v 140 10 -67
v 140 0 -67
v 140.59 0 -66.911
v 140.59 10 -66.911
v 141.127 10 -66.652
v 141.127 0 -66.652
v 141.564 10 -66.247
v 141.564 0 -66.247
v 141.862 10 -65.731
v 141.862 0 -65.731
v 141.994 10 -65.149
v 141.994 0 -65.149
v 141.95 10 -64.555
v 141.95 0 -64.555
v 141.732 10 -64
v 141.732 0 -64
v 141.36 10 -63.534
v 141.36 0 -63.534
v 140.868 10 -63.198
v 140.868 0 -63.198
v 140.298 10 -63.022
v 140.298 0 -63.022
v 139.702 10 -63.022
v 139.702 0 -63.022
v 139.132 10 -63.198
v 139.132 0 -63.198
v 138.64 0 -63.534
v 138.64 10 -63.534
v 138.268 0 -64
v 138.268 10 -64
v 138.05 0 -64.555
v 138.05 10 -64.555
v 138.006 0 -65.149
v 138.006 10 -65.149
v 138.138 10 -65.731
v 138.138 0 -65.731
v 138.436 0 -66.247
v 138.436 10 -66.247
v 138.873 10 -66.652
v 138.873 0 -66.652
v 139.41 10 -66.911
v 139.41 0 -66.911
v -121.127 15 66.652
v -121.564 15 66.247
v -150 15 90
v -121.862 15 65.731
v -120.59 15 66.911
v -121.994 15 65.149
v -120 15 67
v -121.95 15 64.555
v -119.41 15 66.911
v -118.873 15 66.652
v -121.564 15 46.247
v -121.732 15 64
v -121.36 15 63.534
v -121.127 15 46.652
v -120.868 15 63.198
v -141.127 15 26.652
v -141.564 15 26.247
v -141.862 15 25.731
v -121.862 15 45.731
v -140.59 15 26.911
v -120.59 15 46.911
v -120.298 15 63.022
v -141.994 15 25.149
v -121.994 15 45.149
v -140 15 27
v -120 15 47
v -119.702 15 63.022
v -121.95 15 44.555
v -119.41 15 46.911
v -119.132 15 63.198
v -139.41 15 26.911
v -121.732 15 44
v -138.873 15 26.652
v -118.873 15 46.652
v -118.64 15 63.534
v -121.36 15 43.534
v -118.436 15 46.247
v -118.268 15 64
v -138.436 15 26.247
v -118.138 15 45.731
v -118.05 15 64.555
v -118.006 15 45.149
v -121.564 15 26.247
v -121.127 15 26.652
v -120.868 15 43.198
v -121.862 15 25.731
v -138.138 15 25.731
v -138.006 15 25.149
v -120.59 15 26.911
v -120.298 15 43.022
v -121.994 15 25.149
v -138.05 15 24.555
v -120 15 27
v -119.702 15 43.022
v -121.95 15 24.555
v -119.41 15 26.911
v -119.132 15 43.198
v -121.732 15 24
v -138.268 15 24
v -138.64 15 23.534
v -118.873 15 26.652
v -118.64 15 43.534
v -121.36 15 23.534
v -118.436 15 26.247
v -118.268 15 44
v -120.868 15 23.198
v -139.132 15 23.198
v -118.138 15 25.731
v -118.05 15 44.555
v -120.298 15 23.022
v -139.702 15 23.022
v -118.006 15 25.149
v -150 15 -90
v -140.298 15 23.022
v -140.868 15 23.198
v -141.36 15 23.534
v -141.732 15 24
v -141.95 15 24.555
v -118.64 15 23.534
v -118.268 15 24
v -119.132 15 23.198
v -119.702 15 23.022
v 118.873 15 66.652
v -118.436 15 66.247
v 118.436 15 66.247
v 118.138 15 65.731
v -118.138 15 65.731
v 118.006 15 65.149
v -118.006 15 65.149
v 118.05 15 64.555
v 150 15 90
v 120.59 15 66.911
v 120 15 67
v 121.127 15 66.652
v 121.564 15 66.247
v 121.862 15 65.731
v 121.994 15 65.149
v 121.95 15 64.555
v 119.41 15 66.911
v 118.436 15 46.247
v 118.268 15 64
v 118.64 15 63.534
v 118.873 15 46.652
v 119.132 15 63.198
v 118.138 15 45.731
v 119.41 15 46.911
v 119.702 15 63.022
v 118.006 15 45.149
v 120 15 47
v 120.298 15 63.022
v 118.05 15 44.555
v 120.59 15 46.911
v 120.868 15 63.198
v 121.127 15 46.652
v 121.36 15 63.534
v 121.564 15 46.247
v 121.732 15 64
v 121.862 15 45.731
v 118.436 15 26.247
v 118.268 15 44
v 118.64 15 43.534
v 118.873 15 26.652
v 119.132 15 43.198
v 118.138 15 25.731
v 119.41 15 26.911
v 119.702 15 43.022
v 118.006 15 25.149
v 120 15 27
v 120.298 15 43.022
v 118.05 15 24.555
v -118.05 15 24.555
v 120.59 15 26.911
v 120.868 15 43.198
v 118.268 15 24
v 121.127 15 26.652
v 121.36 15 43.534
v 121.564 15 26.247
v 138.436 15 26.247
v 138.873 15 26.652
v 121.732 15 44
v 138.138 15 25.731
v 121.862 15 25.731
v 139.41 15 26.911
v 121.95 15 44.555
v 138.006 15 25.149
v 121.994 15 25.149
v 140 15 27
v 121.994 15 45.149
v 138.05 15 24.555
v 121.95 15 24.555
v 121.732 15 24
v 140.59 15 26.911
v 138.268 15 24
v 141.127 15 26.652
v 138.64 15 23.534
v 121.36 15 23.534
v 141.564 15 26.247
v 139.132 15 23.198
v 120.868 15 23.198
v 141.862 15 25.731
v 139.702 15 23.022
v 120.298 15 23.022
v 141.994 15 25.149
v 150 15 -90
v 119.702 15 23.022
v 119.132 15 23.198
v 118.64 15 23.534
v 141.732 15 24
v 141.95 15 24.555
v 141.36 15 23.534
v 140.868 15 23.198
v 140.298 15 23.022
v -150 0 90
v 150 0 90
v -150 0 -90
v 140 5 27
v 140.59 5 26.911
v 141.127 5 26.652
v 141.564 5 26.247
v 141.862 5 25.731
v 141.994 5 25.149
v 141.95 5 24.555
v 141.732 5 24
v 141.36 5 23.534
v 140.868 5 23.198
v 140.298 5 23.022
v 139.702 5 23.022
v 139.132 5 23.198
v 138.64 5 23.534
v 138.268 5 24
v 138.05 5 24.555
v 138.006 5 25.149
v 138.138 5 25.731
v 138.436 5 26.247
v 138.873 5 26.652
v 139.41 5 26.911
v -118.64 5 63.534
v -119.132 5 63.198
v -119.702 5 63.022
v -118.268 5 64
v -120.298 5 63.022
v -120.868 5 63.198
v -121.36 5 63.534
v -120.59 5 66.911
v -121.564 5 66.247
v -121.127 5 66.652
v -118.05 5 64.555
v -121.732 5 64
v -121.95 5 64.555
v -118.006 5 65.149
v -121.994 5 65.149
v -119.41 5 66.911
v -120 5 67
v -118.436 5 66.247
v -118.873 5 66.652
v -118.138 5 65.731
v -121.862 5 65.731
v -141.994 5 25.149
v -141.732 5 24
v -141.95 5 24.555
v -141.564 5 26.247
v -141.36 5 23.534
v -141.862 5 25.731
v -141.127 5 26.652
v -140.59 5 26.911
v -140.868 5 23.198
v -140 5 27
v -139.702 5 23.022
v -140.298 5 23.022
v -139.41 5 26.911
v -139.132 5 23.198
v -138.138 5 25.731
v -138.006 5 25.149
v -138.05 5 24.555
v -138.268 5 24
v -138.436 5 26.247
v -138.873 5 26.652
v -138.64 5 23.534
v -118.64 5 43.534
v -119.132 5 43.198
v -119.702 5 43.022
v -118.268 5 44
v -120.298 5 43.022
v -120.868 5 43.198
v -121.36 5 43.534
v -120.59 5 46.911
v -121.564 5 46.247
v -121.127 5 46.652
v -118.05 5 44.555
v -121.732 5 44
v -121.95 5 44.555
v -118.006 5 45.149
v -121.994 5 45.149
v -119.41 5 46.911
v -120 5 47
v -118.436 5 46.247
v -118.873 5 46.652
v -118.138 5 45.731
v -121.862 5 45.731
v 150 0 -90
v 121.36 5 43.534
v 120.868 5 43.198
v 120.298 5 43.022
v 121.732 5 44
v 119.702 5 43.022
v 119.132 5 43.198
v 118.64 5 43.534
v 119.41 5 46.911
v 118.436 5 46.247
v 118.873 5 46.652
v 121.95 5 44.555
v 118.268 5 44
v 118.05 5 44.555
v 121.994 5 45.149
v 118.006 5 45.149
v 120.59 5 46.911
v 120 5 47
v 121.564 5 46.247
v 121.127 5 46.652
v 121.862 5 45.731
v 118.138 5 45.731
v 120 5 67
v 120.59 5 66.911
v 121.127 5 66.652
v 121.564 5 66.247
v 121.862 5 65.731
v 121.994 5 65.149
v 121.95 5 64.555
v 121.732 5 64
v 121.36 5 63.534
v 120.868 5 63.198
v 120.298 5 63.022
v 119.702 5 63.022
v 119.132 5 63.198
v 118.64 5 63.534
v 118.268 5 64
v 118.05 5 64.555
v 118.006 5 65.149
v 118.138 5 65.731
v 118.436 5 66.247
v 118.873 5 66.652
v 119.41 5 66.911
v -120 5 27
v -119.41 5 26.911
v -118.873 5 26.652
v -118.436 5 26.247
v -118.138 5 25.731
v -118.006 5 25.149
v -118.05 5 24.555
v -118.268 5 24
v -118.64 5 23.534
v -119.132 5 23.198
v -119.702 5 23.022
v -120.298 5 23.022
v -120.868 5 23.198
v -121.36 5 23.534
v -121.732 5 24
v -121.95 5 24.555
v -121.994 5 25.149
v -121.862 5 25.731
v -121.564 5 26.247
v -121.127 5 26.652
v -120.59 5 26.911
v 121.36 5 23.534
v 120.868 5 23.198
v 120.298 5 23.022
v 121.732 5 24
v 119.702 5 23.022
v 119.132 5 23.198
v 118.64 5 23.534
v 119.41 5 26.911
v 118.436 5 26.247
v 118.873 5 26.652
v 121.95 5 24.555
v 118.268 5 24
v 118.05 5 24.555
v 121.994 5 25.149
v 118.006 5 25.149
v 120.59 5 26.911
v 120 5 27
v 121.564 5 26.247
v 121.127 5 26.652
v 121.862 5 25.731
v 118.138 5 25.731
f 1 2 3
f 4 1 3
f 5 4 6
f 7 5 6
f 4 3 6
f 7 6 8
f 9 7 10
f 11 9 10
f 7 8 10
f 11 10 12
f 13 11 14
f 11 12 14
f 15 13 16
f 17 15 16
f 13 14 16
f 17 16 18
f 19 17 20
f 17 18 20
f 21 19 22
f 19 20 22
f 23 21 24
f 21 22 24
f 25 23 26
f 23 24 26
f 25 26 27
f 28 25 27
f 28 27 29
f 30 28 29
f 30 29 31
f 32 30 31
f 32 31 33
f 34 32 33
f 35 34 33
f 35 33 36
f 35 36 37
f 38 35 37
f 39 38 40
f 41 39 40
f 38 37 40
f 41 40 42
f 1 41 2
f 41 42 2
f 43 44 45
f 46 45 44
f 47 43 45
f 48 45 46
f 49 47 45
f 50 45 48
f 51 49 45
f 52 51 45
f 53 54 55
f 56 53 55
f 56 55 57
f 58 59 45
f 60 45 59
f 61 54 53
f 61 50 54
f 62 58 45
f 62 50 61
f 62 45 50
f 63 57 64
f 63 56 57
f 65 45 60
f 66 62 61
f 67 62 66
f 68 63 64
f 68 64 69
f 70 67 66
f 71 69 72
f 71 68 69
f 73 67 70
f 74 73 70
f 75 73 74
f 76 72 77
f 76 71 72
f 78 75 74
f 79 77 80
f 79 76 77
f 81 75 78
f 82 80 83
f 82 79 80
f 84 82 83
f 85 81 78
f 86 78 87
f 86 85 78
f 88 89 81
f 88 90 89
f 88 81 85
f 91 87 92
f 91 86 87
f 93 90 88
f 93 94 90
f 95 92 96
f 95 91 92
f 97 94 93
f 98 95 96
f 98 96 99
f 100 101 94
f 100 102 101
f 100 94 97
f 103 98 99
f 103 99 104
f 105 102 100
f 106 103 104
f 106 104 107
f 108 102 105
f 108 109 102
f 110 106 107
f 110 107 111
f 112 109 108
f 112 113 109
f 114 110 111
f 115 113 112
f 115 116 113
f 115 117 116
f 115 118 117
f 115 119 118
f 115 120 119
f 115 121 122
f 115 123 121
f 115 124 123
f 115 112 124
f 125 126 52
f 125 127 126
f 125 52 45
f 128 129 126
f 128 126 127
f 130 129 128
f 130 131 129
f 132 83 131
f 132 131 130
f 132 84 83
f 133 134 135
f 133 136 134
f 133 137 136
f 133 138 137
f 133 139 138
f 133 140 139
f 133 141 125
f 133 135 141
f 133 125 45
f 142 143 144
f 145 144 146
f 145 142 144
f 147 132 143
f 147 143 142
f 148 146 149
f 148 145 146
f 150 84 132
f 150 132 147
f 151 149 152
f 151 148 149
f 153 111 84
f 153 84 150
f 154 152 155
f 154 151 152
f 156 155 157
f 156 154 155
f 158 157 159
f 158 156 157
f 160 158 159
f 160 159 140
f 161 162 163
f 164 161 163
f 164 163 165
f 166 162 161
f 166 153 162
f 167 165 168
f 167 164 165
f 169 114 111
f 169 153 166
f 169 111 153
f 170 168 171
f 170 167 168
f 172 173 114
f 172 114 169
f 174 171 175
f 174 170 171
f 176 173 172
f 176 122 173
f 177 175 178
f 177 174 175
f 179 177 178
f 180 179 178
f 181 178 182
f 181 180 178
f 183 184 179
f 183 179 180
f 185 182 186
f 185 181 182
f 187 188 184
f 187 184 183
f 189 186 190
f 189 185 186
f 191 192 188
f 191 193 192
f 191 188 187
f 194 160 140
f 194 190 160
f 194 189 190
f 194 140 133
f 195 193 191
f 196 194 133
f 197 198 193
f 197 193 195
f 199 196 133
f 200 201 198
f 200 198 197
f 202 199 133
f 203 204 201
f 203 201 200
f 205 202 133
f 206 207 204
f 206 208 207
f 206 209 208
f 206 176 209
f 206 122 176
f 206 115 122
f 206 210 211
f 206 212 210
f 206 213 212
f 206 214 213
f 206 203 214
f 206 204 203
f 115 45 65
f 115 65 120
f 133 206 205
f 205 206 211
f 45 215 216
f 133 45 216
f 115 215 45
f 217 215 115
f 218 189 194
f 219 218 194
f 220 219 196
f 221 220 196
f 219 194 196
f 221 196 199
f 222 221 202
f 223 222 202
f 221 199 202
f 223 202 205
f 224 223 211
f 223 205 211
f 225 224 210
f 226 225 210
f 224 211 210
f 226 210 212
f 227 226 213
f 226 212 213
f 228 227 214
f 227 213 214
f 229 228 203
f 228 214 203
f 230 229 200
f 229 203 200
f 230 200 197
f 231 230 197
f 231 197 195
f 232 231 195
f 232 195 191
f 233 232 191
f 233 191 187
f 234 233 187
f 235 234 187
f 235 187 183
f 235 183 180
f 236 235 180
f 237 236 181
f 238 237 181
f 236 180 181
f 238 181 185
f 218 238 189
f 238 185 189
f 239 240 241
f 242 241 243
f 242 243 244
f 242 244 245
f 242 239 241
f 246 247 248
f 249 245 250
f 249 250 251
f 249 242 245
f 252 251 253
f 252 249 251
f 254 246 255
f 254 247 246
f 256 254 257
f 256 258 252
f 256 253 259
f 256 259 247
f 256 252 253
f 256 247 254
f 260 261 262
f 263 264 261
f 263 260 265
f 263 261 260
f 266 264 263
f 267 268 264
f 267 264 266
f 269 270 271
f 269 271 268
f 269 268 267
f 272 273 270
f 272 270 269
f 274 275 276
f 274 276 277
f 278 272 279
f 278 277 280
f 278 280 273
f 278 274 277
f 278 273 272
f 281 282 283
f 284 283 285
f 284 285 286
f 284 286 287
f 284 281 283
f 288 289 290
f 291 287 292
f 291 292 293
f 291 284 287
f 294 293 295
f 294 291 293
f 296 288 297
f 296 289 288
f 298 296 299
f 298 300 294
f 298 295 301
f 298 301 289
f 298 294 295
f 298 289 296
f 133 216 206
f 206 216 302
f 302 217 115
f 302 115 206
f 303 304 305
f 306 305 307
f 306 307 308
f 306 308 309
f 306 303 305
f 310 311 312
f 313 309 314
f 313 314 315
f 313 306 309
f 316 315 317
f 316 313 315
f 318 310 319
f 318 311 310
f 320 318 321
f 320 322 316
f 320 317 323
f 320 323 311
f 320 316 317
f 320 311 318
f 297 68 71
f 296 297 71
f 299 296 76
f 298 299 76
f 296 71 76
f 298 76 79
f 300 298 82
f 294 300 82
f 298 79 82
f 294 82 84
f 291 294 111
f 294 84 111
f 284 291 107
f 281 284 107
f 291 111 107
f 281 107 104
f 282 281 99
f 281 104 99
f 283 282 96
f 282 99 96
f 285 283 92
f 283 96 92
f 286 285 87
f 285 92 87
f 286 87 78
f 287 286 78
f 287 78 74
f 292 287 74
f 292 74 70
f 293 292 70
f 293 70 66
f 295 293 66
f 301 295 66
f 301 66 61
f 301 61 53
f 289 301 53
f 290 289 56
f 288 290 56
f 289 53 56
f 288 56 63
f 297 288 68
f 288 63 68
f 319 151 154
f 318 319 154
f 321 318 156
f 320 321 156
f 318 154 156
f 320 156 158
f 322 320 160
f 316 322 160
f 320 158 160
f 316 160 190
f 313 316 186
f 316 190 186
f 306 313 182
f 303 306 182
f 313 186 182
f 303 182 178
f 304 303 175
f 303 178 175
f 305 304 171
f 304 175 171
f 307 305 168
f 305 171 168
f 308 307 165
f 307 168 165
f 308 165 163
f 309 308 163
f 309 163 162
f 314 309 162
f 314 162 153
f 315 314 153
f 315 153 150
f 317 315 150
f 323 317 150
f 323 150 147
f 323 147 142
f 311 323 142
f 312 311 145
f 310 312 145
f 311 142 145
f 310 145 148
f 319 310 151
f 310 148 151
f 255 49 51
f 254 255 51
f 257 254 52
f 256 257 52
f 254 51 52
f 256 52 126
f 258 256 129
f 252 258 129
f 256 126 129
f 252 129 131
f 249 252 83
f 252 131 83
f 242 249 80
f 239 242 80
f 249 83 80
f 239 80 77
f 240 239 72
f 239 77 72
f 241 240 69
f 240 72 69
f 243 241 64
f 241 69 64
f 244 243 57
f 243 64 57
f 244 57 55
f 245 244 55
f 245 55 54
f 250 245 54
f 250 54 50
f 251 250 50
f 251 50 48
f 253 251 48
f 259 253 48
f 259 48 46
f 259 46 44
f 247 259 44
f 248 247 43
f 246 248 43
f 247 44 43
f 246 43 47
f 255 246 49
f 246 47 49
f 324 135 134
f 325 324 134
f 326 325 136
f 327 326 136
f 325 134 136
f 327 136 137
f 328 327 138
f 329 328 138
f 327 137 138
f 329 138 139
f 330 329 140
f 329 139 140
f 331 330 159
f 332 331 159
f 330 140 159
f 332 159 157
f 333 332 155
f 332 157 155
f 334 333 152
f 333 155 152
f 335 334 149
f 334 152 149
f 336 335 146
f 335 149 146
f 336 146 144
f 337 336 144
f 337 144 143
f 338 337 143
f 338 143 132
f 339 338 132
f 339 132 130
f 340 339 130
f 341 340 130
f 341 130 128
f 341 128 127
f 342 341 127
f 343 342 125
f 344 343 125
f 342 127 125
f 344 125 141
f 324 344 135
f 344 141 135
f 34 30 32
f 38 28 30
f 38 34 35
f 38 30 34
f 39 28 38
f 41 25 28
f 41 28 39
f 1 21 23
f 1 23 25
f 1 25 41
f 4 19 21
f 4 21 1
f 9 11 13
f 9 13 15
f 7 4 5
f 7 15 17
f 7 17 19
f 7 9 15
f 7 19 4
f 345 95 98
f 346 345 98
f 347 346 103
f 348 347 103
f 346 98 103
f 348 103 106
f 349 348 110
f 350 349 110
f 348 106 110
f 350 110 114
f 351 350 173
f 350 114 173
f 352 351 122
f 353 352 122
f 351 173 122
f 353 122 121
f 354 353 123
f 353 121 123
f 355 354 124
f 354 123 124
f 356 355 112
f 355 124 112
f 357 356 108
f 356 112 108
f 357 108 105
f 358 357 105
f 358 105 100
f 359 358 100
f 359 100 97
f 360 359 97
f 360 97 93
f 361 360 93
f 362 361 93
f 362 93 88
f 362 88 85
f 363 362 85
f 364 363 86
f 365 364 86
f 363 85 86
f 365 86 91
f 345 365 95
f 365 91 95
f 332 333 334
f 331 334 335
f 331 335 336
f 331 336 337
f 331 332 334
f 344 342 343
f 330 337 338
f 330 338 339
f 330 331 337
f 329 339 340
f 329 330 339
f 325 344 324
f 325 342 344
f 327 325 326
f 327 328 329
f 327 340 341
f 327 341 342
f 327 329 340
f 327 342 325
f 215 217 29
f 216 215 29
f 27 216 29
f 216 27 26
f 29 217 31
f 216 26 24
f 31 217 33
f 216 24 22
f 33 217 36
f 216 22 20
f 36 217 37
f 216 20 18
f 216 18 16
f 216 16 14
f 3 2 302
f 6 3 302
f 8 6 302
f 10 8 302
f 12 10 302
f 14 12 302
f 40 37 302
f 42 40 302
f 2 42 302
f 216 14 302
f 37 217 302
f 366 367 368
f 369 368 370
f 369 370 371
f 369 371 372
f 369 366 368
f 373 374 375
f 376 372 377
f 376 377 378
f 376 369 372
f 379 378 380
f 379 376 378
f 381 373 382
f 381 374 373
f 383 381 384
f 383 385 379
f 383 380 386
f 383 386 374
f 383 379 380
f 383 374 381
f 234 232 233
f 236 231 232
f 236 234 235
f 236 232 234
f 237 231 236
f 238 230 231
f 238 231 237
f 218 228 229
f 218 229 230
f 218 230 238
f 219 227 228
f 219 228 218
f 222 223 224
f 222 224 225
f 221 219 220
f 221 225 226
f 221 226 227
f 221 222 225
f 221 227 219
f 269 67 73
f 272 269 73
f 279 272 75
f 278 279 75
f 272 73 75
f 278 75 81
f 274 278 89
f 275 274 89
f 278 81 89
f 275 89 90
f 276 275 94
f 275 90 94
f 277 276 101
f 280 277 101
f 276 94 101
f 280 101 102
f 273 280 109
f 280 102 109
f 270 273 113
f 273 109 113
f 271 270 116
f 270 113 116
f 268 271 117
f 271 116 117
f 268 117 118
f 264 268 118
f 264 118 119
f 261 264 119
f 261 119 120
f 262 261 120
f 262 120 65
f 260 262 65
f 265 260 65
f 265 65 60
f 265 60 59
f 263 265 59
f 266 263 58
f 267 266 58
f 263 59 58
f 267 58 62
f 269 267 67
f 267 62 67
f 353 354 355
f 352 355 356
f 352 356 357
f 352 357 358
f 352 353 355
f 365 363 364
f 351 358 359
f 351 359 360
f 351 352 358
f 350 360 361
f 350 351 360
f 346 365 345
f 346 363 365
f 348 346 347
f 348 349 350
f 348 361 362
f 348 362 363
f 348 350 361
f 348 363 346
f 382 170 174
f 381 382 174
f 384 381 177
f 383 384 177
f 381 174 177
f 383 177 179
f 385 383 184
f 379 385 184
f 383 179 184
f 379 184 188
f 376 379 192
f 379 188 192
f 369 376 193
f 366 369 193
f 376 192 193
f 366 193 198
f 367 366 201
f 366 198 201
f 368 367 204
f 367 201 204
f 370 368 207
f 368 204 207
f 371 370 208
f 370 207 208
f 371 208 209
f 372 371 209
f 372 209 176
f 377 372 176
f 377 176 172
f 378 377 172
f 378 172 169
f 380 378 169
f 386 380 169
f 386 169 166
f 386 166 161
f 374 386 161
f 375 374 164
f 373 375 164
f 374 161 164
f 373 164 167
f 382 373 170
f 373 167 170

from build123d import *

# Parameters (mm, degrees)
CROQUIS1_W              = 300
CROQUIS1_H              = 180
SALIENTE_EXTRUIR1_DEPTH = 15
CROQUIS2_R              = 2
CORTAR_EXTRUIR1_DEPTH   = 10
CROQUIS3_R              = 2
CORTAR_EXTRUIR2_DEPTH   = 10


with BuildPart() as part:
    # Croquis1 → Saliente-Extruir1 (new body)
    with BuildSketch(Plane(origin=(0, 0, 0), x_dir=(1, 0, 0), z_dir=(0, 1, 0))):
        Rectangle(CROQUIS1_W, CROQUIS1_H)
    extrude(amount=SALIENTE_EXTRUIR1_DEPTH)

    # Croquis2 → Cortar-Extruir1 (cut)
    with BuildSketch(Plane(origin=(0, 15, 0), x_dir=(1, 0, 0), z_dir=(0, 1, 0))):
        with Locations(Location((-120, -65, 0), (0, 0, 270))):
            Circle(CROQUIS2_R)
        with Locations(Location((-120, -45, 0), (0, 0, 270))):
            Circle(CROQUIS2_R)
        with Locations(Location((120, -65, 0), (0, 0, 270))):
            Circle(CROQUIS2_R)
        with Locations(Location((120, -45, 0), (0, 0, 270))):
            Circle(CROQUIS2_R)
        with Locations(Location((-140, -25, 0), (0, 0, 270))):
            Circle(CROQUIS2_R)
        with Locations(Location((-120, -25, 0), (0, 0, 270))):
            Circle(CROQUIS2_R)
        with Locations(Location((120, -25, 0), (0, 0, 270))):
            Circle(CROQUIS2_R)
        with Locations(Location((140, -25, 0), (0, 0, 270))):
            Circle(CROQUIS2_R)
    extrude(amount=-CORTAR_EXTRUIR1_DEPTH, mode=Mode.SUBTRACT)

    # Croquis3 → Cortar-Extruir2 (cut)
    with BuildSketch(Plane.XZ):
        with Locations(Location((140, -65, 0), (0, 0, 270))):
            Circle(CROQUIS3_R)
    extrude(amount=-CORTAR_EXTRUIR2_DEPTH, mode=Mode.SUBTRACT)


solid = part.part
